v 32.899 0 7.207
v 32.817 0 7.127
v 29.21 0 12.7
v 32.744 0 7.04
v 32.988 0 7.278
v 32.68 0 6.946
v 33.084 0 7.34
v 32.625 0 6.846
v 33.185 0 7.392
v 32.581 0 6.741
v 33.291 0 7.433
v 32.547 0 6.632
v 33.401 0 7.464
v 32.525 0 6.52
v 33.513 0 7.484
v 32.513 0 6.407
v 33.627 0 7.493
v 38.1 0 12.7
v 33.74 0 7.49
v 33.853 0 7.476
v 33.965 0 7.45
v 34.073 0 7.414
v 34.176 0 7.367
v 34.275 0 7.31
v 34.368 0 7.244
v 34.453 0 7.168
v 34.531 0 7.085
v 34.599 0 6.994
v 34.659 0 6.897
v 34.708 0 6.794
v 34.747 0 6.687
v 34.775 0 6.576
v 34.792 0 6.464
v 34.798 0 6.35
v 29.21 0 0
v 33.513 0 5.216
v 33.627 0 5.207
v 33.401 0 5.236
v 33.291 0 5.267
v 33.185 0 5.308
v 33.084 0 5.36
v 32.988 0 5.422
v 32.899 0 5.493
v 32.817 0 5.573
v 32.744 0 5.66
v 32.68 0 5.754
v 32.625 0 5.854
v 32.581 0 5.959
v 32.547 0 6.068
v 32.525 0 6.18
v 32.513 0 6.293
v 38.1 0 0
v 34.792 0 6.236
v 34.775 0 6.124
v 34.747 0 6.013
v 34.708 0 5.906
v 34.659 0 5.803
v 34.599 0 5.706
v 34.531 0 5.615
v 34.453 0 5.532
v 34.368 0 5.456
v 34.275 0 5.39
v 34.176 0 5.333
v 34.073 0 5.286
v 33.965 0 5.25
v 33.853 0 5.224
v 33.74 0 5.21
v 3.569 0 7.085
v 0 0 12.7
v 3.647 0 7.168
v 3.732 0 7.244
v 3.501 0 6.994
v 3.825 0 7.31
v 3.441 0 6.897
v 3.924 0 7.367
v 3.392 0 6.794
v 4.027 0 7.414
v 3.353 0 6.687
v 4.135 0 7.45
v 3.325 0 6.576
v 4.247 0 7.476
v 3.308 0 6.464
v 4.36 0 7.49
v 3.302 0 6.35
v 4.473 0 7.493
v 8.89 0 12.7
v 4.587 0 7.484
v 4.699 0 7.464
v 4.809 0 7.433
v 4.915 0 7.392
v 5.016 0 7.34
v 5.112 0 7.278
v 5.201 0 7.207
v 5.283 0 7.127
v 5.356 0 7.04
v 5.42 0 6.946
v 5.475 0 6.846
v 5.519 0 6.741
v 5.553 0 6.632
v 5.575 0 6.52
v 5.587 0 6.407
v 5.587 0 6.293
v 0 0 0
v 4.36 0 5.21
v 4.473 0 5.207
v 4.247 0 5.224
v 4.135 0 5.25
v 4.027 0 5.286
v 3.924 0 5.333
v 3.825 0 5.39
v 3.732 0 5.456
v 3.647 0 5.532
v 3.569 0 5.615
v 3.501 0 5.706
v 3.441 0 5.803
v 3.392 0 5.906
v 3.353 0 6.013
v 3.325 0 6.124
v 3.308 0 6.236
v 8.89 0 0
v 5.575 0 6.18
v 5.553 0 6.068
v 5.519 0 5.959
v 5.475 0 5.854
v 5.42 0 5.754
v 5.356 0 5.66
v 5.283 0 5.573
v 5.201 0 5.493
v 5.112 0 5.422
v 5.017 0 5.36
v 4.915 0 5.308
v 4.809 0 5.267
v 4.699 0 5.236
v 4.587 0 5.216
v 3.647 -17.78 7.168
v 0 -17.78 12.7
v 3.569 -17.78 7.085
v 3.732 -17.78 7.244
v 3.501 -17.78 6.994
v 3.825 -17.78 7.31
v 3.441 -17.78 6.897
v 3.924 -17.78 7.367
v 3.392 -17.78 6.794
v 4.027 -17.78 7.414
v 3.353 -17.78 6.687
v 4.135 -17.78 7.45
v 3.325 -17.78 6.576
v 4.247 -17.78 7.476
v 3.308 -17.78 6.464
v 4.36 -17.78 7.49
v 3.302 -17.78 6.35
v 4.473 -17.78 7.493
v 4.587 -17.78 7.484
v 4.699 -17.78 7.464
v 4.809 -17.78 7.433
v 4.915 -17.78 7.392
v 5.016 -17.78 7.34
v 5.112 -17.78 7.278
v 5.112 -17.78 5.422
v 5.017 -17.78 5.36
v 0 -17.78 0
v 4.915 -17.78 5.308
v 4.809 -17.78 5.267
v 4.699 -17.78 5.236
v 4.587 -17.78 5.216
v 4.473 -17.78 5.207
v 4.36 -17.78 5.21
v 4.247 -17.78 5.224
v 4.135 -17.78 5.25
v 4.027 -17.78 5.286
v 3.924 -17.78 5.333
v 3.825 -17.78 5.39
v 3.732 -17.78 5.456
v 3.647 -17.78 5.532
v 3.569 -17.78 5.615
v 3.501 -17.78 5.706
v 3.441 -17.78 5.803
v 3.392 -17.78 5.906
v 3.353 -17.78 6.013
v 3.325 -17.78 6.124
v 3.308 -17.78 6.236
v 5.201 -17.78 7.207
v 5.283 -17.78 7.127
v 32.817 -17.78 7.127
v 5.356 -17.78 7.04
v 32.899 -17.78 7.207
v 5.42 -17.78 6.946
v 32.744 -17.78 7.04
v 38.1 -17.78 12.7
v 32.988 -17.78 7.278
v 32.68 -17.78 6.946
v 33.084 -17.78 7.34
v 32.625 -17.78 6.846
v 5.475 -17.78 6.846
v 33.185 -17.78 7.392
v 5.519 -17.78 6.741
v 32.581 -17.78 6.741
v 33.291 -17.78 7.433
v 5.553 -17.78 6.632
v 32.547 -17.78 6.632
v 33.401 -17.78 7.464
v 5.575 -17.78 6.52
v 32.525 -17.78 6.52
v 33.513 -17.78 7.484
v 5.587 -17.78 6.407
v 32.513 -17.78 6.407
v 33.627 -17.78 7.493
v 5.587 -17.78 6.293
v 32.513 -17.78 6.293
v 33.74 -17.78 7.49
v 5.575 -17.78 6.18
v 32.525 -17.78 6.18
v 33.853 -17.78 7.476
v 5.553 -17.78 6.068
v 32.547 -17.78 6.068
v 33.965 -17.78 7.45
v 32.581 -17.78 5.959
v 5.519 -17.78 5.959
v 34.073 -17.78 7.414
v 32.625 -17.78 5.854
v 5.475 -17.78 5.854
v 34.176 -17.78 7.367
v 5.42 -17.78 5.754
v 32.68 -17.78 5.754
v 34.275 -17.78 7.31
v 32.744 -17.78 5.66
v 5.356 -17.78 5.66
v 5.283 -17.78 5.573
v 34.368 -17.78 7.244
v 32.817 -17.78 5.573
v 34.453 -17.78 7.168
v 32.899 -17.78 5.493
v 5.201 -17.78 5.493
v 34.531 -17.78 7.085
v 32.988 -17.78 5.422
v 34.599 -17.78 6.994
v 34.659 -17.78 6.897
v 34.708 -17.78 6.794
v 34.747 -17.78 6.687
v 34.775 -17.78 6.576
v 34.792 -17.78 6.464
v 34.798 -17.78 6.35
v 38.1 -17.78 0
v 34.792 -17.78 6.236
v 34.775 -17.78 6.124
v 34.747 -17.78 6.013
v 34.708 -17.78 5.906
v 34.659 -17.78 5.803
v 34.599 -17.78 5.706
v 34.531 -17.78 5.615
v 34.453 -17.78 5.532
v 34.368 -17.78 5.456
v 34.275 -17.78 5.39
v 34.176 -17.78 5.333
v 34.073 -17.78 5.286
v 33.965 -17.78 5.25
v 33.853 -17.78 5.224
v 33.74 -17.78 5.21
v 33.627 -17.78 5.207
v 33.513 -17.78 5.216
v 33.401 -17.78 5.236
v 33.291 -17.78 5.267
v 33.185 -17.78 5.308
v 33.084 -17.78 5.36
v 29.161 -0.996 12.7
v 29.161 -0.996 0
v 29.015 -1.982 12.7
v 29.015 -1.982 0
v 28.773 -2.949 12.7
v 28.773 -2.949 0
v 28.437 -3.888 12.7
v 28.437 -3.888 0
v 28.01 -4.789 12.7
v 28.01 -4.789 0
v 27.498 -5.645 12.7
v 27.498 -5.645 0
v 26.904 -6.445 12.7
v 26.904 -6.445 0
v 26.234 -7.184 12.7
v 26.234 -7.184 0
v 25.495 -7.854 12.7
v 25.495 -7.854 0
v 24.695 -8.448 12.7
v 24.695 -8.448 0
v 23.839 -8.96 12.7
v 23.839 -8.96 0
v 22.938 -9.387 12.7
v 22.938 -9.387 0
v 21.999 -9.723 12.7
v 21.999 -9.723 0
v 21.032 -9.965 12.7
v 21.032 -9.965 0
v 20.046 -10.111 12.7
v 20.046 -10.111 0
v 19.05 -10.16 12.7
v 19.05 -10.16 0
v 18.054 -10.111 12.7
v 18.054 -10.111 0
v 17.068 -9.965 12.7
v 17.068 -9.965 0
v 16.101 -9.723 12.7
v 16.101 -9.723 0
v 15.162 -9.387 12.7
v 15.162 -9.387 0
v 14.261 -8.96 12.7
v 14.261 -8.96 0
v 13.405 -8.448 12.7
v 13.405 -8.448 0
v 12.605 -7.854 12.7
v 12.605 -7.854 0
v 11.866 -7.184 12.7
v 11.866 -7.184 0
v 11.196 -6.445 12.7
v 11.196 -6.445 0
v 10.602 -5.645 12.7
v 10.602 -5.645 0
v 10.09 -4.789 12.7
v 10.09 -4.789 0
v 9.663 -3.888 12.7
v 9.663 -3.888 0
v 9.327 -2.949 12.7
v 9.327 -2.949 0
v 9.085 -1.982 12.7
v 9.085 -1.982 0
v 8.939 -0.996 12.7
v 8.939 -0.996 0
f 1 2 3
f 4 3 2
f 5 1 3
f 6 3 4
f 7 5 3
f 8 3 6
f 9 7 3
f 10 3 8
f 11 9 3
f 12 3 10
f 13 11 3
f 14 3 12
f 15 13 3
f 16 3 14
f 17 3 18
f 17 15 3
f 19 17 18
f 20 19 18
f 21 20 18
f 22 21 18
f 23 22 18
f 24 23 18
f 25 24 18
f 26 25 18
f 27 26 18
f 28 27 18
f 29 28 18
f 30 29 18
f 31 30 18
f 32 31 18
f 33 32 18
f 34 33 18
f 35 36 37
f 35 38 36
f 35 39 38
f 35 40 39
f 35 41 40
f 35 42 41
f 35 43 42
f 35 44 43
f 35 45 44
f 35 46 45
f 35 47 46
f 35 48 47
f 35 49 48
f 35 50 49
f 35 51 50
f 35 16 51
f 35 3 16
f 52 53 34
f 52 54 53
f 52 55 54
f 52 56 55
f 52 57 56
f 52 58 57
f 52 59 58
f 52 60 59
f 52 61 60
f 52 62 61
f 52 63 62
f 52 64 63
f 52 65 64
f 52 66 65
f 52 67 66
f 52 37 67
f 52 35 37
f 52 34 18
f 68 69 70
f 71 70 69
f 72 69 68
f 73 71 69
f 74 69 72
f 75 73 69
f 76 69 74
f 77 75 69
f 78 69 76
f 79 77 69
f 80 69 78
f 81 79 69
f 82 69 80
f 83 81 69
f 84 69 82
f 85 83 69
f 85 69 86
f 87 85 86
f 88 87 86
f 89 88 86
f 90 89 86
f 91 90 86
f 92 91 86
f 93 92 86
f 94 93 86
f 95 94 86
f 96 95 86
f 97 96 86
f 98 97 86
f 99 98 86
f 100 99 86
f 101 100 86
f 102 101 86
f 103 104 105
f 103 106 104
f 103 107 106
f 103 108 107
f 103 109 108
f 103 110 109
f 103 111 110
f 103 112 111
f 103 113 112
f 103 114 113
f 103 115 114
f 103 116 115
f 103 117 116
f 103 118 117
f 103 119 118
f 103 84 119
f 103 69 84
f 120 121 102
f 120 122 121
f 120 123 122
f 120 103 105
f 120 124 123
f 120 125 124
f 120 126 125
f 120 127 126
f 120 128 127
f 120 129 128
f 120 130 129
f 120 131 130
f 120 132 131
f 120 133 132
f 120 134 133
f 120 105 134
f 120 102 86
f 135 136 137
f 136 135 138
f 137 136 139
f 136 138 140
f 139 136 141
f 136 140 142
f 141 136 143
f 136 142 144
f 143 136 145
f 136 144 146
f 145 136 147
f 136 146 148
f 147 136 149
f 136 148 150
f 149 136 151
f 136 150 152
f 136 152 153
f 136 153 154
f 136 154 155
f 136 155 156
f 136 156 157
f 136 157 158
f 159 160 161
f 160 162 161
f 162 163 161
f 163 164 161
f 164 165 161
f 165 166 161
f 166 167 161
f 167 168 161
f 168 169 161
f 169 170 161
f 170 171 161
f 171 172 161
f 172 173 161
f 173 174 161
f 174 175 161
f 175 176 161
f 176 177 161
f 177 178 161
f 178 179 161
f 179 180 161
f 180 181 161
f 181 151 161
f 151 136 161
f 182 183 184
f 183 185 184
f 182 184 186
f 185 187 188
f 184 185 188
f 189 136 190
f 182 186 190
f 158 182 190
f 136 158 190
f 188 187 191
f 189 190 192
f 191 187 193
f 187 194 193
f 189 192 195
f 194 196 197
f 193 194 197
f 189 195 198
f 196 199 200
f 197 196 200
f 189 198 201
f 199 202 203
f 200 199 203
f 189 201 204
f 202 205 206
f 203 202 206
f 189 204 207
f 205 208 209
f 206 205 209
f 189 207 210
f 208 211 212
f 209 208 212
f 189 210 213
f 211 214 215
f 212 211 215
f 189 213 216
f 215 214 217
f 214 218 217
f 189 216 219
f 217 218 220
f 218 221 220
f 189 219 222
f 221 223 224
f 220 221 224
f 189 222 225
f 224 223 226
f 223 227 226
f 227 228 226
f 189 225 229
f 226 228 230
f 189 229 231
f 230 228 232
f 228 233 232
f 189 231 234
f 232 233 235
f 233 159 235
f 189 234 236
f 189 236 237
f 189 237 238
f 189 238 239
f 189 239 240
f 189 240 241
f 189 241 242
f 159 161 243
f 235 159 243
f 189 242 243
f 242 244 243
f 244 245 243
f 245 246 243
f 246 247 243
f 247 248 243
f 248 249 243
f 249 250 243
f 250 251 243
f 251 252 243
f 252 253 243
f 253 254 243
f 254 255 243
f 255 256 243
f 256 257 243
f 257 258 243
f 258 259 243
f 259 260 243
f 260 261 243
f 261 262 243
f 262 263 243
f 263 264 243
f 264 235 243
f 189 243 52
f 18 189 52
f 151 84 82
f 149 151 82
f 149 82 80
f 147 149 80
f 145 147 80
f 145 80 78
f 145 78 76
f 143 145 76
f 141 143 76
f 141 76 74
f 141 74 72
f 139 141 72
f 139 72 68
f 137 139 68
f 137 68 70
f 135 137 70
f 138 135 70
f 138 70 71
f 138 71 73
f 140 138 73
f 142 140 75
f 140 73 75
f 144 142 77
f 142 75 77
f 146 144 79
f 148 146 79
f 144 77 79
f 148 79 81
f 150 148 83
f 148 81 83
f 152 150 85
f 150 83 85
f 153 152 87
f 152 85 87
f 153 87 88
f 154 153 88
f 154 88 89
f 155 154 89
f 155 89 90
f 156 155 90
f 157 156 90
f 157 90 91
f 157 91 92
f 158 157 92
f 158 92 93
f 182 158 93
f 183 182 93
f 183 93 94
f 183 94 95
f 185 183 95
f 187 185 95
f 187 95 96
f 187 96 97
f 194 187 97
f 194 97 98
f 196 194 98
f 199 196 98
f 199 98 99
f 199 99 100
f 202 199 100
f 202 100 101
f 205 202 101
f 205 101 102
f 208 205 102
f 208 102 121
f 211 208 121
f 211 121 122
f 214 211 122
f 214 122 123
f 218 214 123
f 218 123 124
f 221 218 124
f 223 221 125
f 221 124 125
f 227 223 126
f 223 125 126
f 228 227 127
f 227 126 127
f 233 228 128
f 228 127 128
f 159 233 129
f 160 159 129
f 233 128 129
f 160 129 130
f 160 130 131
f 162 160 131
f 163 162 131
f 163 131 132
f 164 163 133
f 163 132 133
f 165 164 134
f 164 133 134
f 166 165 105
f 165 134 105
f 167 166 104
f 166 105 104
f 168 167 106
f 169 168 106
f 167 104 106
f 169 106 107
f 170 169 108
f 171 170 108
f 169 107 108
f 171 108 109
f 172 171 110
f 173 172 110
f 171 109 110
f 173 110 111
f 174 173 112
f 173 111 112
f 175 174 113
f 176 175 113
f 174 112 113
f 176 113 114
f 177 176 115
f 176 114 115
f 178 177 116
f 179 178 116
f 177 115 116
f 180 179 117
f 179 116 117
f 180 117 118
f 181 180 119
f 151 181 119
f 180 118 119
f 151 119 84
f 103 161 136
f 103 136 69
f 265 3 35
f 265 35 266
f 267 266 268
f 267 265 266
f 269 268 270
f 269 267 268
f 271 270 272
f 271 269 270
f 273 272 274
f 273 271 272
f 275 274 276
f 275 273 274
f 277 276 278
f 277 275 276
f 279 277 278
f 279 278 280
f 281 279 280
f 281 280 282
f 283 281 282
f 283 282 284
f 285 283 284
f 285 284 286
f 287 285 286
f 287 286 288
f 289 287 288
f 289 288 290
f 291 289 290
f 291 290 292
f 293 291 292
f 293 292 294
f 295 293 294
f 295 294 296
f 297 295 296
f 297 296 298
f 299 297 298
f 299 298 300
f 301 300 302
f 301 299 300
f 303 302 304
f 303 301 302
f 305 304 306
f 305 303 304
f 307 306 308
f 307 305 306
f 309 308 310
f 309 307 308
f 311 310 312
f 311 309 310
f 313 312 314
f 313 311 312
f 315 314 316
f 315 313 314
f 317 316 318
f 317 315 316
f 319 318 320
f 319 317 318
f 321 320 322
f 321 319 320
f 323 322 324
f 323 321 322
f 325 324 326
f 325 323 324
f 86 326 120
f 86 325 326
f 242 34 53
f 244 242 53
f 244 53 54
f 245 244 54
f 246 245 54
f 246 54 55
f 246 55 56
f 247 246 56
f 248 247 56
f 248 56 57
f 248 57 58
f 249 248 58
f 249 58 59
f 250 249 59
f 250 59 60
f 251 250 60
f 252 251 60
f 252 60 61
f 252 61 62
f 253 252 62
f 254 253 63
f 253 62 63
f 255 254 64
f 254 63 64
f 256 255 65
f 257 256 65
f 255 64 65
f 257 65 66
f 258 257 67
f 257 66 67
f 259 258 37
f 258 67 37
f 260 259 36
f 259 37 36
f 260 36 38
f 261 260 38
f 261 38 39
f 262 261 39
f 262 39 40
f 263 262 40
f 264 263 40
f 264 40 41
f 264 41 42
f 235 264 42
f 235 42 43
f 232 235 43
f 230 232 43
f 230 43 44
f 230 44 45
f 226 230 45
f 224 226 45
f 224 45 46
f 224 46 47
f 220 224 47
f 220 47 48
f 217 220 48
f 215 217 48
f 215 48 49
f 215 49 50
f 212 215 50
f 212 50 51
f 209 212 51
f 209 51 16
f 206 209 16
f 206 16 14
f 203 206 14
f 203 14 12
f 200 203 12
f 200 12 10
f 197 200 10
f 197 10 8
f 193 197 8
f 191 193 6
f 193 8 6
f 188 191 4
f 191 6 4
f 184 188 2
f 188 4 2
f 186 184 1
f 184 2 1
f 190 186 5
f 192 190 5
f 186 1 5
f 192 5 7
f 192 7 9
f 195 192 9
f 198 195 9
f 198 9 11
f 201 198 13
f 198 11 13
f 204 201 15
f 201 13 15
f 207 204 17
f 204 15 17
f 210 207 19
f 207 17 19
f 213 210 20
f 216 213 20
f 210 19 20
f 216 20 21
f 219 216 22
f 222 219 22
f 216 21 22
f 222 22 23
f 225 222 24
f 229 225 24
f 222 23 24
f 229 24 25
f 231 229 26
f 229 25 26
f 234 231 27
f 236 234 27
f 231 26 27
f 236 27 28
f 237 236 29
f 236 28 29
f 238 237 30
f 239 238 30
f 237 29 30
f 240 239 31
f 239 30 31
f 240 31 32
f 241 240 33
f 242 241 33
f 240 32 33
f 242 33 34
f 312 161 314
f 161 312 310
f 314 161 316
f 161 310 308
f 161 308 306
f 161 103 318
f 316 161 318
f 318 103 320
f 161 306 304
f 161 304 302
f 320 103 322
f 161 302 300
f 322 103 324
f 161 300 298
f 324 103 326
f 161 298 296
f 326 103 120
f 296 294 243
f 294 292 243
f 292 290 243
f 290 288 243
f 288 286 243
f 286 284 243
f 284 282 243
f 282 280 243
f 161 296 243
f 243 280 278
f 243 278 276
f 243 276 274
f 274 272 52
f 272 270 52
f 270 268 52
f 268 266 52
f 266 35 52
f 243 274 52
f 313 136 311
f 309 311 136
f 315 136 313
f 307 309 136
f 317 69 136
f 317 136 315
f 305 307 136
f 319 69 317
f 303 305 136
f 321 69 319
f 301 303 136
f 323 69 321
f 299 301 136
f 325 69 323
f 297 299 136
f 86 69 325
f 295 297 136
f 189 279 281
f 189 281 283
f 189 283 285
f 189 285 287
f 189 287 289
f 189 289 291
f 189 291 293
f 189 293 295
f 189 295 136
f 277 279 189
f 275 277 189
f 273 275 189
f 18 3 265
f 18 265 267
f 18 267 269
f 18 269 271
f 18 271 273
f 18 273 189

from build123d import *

# Parameters (mm, degrees)
SKETCH1_W           = 38.1
SKETCH1_H           = 17.78
BOSS_EXTRUDE1_DEPTH = 12.7
CUT_EXTRUDE1_DEPTH  = 13.7
CUT_EXTRUDE2_DEPTH  = 18.78


with BuildPart() as part:
    # Sketch1 → Boss-Extrude1 (new body)
    with BuildSketch(Plane.XY):
        with Locations((19.05, -8.89)):
            Rectangle(SKETCH1_W, SKETCH1_H)
    extrude(amount=BOSS_EXTRUDE1_DEPTH)

    # Sketch4 → Cut-Extrude1 (cut, through all)
    with BuildSketch(Plane.XY.offset(12.7)):
        with BuildLine():
            Line((19.05, 0), (29.21, 0))
            ThreePointArc((29.21, 0), (19.05, -10.16), (8.89, 0))
            Line((8.89, 0), (19.05, 0))
        make_face()
    extrude(amount=-CUT_EXTRUDE1_DEPTH, mode=Mode.SUBTRACT)

    # Sketch5 → Cut-Extrude2 (cut, through all)
    with BuildSketch(Plane(origin=(0, 0, 0), x_dir=(1, 0, 0), z_dir=(0, 1, 0))):
        with BuildLine():
            ThreePointArc((5.588, -6.35), (4.445, -5.207), (3.302, -6.35))
            Line((3.302, -6.35), (5.588, -6.35))
        make_face()
        with BuildLine():
            Line((5.588, -6.35), (3.302, -6.35))
            ThreePointArc((3.302, -6.35), (4.445, -7.493), (5.588, -6.35))
        make_face()
        with BuildLine():
            ThreePointArc((32.512, -6.35), (33.655, -7.493), (34.798, -6.35))
            Line((34.798, -6.35), (32.512, -6.35))
        make_face()
        with BuildLine():
            Line((32.512, -6.35), (34.798, -6.35))
            ThreePointArc((34.798, -6.35), (33.655, -5.207), (32.512, -6.35))
        make_face()
    extrude(amount=-CUT_EXTRUDE2_DEPTH, mode=Mode.SUBTRACT)


solid = part.part
